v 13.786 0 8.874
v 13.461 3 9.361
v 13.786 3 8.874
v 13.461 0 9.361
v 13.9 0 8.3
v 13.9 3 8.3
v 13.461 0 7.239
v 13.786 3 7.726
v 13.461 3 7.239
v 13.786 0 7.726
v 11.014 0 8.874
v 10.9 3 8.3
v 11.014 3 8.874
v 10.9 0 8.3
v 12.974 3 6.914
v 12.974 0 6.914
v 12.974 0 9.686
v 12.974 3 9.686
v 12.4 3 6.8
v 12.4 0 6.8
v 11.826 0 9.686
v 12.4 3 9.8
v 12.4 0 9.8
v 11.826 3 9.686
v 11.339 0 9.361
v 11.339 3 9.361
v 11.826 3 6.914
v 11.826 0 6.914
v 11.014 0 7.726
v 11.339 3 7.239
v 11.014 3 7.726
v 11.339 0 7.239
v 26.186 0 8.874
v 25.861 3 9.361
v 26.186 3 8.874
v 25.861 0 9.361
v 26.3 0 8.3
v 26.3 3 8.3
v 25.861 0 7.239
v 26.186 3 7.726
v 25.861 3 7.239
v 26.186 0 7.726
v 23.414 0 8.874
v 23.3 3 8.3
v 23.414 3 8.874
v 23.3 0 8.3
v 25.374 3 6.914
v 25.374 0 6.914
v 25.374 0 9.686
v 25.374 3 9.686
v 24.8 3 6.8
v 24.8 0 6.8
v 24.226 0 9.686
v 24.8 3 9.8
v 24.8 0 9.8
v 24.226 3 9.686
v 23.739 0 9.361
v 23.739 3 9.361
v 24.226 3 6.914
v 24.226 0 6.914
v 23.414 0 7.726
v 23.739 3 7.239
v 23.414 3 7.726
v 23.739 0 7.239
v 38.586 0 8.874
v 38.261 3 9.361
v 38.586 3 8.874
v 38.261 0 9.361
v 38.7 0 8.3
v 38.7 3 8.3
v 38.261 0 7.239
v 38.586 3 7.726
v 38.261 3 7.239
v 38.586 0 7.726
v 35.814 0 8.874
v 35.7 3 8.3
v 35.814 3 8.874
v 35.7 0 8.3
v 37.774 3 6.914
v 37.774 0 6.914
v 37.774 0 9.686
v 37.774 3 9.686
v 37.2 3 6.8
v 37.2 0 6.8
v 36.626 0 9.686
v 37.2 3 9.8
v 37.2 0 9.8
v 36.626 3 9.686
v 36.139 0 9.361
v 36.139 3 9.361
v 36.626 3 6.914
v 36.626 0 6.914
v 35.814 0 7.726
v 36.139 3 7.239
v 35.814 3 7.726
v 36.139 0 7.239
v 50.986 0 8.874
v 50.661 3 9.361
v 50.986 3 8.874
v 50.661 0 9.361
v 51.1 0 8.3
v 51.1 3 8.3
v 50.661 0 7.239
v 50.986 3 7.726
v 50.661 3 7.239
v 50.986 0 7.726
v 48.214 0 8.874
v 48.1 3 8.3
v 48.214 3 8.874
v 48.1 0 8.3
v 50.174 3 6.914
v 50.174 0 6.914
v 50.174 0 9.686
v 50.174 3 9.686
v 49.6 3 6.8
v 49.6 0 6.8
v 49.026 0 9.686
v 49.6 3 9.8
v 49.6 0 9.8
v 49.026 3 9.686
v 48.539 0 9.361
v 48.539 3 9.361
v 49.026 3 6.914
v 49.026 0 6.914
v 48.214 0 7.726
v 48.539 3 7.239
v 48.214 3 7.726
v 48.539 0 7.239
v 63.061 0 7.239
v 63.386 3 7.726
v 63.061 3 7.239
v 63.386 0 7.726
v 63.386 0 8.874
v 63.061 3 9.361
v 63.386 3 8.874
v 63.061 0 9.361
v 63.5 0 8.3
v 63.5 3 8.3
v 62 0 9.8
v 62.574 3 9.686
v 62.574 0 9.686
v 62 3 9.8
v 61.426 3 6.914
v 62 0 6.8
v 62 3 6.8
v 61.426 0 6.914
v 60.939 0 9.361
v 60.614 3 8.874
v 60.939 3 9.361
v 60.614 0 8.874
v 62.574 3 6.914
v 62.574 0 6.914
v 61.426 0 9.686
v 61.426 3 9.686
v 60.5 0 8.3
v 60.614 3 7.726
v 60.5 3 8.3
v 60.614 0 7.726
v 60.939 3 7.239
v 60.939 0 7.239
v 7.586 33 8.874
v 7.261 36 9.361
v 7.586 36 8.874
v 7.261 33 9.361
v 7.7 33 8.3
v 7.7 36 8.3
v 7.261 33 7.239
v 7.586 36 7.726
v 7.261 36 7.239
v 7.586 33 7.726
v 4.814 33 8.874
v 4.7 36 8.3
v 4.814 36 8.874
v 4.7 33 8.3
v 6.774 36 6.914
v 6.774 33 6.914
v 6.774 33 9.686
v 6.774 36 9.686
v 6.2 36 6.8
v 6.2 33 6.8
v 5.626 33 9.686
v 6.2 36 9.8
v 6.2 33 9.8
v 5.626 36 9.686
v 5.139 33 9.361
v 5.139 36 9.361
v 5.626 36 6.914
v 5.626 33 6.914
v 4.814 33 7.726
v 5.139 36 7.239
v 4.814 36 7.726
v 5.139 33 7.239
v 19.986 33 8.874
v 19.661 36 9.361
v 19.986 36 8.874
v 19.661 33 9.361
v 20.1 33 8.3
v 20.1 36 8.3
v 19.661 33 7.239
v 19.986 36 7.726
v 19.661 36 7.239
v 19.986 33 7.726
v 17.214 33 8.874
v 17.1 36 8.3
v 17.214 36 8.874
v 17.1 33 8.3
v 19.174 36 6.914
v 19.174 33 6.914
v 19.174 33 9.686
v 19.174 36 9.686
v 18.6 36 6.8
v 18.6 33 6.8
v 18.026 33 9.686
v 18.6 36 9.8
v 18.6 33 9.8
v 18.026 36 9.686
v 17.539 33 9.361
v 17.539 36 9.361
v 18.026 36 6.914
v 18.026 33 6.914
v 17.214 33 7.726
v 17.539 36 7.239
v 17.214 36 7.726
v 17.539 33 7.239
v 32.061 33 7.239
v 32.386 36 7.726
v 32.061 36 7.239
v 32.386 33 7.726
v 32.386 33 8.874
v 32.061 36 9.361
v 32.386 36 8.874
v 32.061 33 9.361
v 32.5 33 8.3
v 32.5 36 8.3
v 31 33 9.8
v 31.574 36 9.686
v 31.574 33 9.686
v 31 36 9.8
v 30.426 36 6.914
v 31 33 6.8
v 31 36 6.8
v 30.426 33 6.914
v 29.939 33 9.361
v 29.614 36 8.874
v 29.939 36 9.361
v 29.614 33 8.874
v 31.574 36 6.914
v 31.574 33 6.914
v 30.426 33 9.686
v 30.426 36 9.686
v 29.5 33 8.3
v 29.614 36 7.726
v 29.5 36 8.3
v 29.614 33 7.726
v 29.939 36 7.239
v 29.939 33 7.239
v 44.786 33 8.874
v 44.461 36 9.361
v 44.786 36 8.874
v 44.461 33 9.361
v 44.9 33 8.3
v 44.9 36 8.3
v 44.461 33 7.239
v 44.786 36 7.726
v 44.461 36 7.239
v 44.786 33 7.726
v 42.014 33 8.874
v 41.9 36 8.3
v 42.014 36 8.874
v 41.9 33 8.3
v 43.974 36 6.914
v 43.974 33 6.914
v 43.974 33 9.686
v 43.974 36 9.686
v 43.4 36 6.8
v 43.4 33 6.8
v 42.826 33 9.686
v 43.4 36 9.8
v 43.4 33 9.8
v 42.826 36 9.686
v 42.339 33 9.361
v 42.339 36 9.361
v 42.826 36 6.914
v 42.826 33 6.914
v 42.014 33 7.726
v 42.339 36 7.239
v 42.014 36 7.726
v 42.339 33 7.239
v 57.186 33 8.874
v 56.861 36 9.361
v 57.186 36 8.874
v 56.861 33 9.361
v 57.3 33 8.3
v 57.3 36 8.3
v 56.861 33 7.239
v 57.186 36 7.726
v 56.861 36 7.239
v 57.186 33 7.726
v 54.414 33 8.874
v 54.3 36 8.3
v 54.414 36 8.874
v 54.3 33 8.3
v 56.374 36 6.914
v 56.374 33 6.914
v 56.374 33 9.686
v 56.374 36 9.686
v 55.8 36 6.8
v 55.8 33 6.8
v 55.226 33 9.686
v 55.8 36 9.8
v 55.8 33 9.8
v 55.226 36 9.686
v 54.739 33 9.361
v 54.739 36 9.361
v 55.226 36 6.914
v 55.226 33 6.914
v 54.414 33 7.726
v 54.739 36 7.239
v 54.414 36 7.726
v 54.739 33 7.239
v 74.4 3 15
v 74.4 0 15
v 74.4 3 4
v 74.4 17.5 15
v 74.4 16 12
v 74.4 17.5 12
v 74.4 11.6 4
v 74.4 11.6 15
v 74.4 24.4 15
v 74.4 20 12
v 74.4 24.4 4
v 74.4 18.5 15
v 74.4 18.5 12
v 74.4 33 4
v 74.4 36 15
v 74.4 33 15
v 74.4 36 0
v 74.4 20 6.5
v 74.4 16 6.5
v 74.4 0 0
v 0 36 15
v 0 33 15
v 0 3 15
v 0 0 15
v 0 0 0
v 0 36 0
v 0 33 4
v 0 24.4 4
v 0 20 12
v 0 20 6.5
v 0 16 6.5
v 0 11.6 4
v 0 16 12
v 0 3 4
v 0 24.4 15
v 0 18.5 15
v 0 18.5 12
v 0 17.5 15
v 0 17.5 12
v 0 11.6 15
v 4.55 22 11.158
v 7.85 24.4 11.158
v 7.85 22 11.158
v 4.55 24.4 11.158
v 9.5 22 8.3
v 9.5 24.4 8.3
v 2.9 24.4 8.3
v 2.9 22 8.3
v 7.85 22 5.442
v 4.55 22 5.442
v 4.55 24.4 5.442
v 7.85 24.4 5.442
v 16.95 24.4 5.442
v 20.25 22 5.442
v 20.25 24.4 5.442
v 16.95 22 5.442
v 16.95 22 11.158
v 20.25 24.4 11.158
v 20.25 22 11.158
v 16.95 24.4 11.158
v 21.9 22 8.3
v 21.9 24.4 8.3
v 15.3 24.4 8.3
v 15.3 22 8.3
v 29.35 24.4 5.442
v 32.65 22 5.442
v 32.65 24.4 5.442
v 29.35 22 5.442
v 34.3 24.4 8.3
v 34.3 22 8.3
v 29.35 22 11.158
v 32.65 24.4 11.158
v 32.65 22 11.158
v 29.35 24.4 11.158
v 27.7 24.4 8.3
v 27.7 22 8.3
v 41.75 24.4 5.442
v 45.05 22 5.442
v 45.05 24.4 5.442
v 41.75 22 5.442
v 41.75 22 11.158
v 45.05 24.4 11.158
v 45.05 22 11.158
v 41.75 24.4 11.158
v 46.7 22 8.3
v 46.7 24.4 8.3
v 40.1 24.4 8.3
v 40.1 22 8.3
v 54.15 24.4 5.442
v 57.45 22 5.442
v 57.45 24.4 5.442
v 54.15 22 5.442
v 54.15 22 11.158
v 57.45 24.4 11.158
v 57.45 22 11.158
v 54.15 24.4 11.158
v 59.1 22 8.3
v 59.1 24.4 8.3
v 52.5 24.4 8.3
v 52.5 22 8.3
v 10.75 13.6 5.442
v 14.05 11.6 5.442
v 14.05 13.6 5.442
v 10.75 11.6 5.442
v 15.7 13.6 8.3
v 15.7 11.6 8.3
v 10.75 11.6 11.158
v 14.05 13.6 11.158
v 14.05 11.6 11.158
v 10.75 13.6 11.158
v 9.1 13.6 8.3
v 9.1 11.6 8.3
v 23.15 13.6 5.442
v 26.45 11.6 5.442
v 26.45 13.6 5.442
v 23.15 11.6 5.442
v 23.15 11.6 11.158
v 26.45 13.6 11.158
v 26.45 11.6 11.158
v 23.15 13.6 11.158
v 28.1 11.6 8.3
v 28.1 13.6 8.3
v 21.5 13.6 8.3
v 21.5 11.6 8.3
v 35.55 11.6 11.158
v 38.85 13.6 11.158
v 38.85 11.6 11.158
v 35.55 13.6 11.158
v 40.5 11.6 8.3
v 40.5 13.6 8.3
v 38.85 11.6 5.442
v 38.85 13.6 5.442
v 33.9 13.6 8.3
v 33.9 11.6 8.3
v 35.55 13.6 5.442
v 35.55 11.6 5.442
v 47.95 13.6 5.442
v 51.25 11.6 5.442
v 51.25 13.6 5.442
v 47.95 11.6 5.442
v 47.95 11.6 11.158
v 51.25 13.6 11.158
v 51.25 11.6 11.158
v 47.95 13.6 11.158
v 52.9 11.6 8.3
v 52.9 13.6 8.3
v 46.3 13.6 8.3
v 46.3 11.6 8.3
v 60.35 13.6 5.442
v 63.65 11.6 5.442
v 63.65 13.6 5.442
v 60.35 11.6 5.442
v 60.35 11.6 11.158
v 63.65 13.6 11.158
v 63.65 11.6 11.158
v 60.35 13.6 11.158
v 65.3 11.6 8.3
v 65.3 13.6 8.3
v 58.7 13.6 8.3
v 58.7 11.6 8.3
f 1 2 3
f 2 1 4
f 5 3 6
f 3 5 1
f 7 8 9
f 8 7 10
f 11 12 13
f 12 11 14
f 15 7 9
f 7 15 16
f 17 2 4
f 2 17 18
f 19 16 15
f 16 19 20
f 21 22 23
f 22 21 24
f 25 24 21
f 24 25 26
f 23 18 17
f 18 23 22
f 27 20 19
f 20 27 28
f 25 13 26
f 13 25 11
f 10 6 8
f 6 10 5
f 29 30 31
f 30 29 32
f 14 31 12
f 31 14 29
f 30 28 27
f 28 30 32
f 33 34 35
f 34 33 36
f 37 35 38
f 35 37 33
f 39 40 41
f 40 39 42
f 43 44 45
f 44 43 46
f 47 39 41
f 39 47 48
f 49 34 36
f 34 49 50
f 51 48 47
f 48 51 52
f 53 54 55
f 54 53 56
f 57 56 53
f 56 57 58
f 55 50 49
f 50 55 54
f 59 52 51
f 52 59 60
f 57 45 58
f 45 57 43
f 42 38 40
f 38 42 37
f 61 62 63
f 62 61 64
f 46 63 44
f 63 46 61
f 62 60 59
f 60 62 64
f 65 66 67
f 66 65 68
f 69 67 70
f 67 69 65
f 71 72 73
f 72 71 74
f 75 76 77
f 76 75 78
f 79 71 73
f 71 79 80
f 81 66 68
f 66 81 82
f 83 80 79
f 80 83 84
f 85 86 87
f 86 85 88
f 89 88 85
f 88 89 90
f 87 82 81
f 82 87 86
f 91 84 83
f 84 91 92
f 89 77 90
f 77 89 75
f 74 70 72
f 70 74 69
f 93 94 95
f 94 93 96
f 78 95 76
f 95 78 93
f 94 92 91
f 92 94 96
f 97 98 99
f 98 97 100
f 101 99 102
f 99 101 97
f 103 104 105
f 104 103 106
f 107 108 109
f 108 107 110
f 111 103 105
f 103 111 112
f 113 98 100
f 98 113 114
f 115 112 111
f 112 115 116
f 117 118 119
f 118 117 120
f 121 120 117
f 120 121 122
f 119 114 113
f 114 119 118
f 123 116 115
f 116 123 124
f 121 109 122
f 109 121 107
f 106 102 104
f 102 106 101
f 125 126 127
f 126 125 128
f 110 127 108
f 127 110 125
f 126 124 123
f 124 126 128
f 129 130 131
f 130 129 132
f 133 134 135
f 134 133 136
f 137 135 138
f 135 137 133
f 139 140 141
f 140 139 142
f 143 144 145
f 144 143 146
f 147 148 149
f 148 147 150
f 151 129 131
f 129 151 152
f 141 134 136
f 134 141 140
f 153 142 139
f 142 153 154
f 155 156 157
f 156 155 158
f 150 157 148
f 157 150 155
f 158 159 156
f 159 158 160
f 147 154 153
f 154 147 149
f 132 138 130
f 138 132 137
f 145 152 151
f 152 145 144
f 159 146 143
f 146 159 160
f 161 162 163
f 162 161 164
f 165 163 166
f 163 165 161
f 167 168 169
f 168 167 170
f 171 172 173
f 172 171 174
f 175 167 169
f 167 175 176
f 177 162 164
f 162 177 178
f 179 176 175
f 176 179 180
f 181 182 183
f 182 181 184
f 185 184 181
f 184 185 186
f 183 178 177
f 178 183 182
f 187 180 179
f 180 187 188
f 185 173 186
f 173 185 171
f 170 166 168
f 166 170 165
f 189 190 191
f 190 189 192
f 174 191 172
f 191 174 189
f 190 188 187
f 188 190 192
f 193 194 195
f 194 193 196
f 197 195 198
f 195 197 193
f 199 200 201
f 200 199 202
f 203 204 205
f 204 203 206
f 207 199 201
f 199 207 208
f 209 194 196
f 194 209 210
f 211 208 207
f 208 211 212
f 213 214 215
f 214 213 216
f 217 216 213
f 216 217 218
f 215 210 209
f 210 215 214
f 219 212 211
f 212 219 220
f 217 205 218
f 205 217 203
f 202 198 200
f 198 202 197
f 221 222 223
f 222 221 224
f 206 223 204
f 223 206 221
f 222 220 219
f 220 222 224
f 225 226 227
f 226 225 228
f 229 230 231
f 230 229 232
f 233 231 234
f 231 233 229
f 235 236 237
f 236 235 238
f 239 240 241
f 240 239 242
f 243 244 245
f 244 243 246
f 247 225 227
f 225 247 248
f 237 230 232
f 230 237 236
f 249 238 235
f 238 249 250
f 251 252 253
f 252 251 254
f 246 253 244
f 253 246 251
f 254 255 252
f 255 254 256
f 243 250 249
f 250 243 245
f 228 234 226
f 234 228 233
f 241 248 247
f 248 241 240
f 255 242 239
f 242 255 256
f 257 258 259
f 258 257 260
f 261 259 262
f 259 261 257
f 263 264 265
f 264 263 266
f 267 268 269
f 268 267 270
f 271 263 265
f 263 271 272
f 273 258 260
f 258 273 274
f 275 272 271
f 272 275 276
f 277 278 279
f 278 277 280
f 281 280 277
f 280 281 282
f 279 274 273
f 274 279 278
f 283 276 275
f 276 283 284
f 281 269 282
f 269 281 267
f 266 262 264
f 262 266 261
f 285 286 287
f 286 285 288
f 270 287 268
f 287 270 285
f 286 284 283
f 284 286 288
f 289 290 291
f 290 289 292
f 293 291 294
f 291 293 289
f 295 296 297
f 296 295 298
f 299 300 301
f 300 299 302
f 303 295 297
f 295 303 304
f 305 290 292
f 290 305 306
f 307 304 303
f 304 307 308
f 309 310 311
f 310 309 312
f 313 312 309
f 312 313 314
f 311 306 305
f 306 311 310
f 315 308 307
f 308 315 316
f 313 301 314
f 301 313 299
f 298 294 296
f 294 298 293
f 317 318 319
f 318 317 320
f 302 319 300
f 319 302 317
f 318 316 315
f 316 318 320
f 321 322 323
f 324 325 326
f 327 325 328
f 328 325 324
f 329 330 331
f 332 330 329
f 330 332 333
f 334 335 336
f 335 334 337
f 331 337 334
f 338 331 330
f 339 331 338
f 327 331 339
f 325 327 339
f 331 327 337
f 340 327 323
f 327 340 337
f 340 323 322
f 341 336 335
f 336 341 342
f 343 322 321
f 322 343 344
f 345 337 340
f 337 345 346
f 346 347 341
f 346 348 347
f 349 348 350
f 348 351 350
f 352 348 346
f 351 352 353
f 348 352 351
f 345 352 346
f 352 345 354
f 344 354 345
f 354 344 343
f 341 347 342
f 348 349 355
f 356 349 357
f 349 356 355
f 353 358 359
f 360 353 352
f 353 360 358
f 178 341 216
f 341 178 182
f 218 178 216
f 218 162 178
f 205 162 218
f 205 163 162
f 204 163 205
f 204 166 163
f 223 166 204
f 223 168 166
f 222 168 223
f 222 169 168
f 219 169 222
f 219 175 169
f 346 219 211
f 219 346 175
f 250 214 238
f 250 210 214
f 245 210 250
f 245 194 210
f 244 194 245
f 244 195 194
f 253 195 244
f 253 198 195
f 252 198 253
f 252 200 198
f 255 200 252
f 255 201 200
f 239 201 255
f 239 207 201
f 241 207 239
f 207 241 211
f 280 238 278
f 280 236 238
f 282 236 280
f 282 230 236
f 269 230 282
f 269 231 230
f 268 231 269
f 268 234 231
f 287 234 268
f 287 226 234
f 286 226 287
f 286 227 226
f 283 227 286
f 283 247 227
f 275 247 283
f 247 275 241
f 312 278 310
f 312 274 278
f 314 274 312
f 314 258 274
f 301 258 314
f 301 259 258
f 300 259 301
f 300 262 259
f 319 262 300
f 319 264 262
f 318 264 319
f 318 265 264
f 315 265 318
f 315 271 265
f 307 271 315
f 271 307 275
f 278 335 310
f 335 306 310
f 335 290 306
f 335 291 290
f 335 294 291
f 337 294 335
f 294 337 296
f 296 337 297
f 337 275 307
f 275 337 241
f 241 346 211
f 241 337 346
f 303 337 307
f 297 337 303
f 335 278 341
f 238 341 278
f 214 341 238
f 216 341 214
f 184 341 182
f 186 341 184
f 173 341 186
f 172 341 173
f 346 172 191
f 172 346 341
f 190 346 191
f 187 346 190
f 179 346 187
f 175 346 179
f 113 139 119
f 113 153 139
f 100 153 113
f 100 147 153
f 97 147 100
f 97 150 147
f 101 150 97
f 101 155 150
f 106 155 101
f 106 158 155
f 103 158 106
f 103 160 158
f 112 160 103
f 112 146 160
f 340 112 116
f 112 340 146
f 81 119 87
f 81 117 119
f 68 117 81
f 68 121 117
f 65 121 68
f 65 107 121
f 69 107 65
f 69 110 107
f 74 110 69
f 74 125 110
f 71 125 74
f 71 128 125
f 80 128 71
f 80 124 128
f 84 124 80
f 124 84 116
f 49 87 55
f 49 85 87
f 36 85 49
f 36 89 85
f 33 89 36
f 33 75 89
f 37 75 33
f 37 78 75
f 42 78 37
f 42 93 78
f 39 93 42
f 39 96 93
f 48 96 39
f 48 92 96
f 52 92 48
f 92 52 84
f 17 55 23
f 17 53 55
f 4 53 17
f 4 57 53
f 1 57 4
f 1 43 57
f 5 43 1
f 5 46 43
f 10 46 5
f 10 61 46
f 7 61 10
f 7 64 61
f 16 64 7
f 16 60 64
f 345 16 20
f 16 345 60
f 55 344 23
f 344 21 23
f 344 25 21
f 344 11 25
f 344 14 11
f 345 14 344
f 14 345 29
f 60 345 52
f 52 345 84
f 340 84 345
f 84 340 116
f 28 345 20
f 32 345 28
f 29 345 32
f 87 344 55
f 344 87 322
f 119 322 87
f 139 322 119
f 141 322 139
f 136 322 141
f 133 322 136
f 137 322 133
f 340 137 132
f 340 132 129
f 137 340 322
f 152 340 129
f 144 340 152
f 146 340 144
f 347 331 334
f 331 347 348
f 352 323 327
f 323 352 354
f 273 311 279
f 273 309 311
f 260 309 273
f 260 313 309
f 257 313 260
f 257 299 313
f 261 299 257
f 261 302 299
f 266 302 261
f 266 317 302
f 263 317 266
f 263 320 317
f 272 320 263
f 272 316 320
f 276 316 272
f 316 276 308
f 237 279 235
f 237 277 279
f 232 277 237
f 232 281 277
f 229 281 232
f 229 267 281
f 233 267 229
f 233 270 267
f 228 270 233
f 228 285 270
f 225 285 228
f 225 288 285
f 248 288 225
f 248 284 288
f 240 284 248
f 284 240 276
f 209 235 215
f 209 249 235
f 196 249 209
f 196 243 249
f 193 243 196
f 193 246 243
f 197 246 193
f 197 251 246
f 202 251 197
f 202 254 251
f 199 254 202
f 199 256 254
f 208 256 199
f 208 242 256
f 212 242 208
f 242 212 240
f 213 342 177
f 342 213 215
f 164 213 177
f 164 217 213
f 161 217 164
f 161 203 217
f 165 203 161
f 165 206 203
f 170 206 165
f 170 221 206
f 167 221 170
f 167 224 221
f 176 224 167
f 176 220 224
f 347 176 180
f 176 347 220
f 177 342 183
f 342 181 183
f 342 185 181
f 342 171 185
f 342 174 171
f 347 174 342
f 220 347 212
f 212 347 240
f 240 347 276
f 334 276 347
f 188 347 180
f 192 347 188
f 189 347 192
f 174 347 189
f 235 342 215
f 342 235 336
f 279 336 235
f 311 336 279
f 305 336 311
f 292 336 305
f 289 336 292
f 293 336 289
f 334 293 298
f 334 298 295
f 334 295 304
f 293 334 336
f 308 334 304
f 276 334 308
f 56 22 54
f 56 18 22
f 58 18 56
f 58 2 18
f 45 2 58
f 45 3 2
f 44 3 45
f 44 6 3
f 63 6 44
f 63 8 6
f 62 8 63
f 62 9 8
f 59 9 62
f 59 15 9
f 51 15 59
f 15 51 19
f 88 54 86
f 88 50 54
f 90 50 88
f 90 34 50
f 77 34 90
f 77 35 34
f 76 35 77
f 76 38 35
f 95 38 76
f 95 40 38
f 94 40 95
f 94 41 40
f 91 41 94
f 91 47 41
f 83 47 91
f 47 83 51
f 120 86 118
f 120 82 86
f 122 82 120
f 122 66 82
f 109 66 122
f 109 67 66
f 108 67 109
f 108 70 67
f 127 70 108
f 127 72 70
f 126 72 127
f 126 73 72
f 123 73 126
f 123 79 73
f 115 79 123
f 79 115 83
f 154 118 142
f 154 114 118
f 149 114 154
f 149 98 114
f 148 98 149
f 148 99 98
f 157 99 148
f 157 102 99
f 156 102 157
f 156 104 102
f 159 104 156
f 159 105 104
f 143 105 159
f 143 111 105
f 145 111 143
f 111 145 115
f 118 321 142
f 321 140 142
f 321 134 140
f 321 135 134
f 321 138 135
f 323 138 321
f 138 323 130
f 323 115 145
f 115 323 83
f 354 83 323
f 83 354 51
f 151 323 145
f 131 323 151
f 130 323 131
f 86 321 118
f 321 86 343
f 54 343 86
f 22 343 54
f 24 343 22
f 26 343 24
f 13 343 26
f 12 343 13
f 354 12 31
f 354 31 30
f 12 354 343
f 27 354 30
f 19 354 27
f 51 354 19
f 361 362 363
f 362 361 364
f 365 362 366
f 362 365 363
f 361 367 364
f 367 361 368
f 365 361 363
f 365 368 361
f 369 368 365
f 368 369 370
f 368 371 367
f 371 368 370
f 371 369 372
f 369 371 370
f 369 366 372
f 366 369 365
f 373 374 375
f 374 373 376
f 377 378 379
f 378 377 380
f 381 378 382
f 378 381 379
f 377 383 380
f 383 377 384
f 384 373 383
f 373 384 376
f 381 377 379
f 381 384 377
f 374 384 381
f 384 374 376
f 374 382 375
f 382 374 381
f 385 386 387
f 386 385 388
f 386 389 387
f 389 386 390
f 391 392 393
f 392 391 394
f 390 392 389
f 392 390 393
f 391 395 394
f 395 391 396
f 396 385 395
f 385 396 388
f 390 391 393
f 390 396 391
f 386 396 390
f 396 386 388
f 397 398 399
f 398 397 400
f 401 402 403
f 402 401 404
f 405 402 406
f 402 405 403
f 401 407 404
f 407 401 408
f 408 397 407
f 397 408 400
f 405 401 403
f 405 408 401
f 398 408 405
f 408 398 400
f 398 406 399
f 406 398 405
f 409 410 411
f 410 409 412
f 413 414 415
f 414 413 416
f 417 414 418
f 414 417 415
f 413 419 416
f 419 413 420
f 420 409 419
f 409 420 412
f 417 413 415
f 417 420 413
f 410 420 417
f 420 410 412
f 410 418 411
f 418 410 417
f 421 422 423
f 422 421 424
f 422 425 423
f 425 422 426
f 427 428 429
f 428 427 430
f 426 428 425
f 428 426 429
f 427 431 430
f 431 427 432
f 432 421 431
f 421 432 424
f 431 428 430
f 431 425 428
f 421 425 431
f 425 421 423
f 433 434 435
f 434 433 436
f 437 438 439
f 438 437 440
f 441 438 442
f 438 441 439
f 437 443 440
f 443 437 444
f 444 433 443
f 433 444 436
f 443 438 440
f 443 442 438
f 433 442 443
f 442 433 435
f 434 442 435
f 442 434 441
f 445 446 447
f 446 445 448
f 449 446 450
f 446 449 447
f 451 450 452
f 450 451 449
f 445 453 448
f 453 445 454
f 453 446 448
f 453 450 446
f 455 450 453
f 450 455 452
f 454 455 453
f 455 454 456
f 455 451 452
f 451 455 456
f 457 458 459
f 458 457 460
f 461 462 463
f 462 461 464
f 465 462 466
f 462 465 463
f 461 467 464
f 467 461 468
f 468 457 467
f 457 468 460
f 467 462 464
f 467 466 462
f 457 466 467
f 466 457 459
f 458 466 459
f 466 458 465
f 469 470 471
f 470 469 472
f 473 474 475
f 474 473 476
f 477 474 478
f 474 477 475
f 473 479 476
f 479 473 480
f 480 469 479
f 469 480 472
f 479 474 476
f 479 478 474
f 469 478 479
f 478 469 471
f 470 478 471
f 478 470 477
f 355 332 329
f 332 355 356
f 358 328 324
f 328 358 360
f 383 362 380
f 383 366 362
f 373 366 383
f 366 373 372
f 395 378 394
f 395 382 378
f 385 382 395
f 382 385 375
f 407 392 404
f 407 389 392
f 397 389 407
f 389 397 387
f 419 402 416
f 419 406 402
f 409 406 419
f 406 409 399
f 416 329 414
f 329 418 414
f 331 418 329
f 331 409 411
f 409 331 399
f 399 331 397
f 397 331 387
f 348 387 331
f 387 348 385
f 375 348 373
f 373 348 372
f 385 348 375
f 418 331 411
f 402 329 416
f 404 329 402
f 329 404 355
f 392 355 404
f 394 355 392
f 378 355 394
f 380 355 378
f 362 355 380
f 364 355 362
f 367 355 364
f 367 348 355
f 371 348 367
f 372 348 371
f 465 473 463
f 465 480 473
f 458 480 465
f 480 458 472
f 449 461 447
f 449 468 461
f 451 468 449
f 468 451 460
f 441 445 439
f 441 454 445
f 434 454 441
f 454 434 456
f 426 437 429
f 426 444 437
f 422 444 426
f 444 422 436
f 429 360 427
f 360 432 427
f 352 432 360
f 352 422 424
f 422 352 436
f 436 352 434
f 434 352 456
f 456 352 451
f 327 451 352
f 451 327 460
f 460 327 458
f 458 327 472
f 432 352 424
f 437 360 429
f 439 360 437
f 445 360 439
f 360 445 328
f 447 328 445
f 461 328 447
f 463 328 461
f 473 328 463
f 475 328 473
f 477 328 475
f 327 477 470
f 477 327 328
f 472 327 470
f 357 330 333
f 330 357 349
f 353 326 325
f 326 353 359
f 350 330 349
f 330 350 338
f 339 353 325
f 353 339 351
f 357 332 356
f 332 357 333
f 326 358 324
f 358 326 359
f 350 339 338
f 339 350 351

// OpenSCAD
//translate([-16.5+disth/2,24+pos,10])cylinder(r=3.3, h=20, $fn=6); 


largoTornilloInicial=20;
sobrante=2;
numTornillos = 5;

largo_caja=30;
alto_caja=15;
diametro_tornillo=3;
cabeza_tornillo=6.2;
grosorPared=3;

grosorSoporte=4.4;

largoTornillo=largoTornilloInicial-sobrante;


anchoCaja=cabeza_tornillo*((numTornillos*2)+2);



module caja(){
cube([anchoCaja, largoTornillo*2, alto_caja]);
}
module huecoCaja(){
	translate([-2, grosorPared, 4])
	cube([anchoCaja+4, (largoTornillo*2)- grosorPared*2, alto_caja]);
}

module soporte(){
	difference(){
		translate([0, largoTornillo-(grosorSoporte+sobrante), 4])
			cube([anchoCaja ,(sobrante*2) + (grosorSoporte*2),alto_caja-4]);
			tuercas();	
		translate([-1, largoTornillo-(sobrante), 4])
			cube([anchoCaja+2 ,(sobrante*2) ,alto_caja-7]);
		translate([-1, largoTornillo-0.5, 8])
			cube([anchoCaja+2 ,1 ,alto_caja-7]);
	}
translate([0, largoTornillo-(sobrante), 0])
			cube([anchoCaja,(sobrante*2) ,alto_caja-8.5]);
}


module tuercas(){

for( i = [1:2:numTornillos*2] ){
	translate([i* cabeza_tornillo, largoTornillo+1+(grosorSoporte+sobrante), 8.3])
	rotate([90,0,0]) cylinder(r=3.3, h=3.4, $fn=6);
}

for( i = [1:numTornillos] ){
	translate([(i*2)*cabeza_tornillo, grosorPared - 1 + largoTornillo-(grosorSoporte+sobrante), 8.3])
	rotate([90,0,0]) cylinder(r=3.3, h=3.4, $fn=6);
}

}



module tornillo(){
translate([0, 0, 0])
for( i = [1:numTornillos] ){
	translate([(i*2)*cabeza_tornillo, largoTornilloInicial, 8.3])
	rotate([90,0,0]) cylinder(r=1.5, h=largoTornilloInicial+3, $fn=16);
}
translate([0, 0, 0])
for( i = [1:2:numTornillos*2] ){
	translate([i* cabeza_tornillo, (largoTornilloInicial*2)-1, 8.3])
	rotate([90,0,0]) cylinder(r=1.5, h=largoTornilloInicial+3, $fn=16);
}
}


module final(){
	difference() {
		caja();
		huecoCaja();
		tornillo();
tornillo();
	}

soporte();


}
final();

